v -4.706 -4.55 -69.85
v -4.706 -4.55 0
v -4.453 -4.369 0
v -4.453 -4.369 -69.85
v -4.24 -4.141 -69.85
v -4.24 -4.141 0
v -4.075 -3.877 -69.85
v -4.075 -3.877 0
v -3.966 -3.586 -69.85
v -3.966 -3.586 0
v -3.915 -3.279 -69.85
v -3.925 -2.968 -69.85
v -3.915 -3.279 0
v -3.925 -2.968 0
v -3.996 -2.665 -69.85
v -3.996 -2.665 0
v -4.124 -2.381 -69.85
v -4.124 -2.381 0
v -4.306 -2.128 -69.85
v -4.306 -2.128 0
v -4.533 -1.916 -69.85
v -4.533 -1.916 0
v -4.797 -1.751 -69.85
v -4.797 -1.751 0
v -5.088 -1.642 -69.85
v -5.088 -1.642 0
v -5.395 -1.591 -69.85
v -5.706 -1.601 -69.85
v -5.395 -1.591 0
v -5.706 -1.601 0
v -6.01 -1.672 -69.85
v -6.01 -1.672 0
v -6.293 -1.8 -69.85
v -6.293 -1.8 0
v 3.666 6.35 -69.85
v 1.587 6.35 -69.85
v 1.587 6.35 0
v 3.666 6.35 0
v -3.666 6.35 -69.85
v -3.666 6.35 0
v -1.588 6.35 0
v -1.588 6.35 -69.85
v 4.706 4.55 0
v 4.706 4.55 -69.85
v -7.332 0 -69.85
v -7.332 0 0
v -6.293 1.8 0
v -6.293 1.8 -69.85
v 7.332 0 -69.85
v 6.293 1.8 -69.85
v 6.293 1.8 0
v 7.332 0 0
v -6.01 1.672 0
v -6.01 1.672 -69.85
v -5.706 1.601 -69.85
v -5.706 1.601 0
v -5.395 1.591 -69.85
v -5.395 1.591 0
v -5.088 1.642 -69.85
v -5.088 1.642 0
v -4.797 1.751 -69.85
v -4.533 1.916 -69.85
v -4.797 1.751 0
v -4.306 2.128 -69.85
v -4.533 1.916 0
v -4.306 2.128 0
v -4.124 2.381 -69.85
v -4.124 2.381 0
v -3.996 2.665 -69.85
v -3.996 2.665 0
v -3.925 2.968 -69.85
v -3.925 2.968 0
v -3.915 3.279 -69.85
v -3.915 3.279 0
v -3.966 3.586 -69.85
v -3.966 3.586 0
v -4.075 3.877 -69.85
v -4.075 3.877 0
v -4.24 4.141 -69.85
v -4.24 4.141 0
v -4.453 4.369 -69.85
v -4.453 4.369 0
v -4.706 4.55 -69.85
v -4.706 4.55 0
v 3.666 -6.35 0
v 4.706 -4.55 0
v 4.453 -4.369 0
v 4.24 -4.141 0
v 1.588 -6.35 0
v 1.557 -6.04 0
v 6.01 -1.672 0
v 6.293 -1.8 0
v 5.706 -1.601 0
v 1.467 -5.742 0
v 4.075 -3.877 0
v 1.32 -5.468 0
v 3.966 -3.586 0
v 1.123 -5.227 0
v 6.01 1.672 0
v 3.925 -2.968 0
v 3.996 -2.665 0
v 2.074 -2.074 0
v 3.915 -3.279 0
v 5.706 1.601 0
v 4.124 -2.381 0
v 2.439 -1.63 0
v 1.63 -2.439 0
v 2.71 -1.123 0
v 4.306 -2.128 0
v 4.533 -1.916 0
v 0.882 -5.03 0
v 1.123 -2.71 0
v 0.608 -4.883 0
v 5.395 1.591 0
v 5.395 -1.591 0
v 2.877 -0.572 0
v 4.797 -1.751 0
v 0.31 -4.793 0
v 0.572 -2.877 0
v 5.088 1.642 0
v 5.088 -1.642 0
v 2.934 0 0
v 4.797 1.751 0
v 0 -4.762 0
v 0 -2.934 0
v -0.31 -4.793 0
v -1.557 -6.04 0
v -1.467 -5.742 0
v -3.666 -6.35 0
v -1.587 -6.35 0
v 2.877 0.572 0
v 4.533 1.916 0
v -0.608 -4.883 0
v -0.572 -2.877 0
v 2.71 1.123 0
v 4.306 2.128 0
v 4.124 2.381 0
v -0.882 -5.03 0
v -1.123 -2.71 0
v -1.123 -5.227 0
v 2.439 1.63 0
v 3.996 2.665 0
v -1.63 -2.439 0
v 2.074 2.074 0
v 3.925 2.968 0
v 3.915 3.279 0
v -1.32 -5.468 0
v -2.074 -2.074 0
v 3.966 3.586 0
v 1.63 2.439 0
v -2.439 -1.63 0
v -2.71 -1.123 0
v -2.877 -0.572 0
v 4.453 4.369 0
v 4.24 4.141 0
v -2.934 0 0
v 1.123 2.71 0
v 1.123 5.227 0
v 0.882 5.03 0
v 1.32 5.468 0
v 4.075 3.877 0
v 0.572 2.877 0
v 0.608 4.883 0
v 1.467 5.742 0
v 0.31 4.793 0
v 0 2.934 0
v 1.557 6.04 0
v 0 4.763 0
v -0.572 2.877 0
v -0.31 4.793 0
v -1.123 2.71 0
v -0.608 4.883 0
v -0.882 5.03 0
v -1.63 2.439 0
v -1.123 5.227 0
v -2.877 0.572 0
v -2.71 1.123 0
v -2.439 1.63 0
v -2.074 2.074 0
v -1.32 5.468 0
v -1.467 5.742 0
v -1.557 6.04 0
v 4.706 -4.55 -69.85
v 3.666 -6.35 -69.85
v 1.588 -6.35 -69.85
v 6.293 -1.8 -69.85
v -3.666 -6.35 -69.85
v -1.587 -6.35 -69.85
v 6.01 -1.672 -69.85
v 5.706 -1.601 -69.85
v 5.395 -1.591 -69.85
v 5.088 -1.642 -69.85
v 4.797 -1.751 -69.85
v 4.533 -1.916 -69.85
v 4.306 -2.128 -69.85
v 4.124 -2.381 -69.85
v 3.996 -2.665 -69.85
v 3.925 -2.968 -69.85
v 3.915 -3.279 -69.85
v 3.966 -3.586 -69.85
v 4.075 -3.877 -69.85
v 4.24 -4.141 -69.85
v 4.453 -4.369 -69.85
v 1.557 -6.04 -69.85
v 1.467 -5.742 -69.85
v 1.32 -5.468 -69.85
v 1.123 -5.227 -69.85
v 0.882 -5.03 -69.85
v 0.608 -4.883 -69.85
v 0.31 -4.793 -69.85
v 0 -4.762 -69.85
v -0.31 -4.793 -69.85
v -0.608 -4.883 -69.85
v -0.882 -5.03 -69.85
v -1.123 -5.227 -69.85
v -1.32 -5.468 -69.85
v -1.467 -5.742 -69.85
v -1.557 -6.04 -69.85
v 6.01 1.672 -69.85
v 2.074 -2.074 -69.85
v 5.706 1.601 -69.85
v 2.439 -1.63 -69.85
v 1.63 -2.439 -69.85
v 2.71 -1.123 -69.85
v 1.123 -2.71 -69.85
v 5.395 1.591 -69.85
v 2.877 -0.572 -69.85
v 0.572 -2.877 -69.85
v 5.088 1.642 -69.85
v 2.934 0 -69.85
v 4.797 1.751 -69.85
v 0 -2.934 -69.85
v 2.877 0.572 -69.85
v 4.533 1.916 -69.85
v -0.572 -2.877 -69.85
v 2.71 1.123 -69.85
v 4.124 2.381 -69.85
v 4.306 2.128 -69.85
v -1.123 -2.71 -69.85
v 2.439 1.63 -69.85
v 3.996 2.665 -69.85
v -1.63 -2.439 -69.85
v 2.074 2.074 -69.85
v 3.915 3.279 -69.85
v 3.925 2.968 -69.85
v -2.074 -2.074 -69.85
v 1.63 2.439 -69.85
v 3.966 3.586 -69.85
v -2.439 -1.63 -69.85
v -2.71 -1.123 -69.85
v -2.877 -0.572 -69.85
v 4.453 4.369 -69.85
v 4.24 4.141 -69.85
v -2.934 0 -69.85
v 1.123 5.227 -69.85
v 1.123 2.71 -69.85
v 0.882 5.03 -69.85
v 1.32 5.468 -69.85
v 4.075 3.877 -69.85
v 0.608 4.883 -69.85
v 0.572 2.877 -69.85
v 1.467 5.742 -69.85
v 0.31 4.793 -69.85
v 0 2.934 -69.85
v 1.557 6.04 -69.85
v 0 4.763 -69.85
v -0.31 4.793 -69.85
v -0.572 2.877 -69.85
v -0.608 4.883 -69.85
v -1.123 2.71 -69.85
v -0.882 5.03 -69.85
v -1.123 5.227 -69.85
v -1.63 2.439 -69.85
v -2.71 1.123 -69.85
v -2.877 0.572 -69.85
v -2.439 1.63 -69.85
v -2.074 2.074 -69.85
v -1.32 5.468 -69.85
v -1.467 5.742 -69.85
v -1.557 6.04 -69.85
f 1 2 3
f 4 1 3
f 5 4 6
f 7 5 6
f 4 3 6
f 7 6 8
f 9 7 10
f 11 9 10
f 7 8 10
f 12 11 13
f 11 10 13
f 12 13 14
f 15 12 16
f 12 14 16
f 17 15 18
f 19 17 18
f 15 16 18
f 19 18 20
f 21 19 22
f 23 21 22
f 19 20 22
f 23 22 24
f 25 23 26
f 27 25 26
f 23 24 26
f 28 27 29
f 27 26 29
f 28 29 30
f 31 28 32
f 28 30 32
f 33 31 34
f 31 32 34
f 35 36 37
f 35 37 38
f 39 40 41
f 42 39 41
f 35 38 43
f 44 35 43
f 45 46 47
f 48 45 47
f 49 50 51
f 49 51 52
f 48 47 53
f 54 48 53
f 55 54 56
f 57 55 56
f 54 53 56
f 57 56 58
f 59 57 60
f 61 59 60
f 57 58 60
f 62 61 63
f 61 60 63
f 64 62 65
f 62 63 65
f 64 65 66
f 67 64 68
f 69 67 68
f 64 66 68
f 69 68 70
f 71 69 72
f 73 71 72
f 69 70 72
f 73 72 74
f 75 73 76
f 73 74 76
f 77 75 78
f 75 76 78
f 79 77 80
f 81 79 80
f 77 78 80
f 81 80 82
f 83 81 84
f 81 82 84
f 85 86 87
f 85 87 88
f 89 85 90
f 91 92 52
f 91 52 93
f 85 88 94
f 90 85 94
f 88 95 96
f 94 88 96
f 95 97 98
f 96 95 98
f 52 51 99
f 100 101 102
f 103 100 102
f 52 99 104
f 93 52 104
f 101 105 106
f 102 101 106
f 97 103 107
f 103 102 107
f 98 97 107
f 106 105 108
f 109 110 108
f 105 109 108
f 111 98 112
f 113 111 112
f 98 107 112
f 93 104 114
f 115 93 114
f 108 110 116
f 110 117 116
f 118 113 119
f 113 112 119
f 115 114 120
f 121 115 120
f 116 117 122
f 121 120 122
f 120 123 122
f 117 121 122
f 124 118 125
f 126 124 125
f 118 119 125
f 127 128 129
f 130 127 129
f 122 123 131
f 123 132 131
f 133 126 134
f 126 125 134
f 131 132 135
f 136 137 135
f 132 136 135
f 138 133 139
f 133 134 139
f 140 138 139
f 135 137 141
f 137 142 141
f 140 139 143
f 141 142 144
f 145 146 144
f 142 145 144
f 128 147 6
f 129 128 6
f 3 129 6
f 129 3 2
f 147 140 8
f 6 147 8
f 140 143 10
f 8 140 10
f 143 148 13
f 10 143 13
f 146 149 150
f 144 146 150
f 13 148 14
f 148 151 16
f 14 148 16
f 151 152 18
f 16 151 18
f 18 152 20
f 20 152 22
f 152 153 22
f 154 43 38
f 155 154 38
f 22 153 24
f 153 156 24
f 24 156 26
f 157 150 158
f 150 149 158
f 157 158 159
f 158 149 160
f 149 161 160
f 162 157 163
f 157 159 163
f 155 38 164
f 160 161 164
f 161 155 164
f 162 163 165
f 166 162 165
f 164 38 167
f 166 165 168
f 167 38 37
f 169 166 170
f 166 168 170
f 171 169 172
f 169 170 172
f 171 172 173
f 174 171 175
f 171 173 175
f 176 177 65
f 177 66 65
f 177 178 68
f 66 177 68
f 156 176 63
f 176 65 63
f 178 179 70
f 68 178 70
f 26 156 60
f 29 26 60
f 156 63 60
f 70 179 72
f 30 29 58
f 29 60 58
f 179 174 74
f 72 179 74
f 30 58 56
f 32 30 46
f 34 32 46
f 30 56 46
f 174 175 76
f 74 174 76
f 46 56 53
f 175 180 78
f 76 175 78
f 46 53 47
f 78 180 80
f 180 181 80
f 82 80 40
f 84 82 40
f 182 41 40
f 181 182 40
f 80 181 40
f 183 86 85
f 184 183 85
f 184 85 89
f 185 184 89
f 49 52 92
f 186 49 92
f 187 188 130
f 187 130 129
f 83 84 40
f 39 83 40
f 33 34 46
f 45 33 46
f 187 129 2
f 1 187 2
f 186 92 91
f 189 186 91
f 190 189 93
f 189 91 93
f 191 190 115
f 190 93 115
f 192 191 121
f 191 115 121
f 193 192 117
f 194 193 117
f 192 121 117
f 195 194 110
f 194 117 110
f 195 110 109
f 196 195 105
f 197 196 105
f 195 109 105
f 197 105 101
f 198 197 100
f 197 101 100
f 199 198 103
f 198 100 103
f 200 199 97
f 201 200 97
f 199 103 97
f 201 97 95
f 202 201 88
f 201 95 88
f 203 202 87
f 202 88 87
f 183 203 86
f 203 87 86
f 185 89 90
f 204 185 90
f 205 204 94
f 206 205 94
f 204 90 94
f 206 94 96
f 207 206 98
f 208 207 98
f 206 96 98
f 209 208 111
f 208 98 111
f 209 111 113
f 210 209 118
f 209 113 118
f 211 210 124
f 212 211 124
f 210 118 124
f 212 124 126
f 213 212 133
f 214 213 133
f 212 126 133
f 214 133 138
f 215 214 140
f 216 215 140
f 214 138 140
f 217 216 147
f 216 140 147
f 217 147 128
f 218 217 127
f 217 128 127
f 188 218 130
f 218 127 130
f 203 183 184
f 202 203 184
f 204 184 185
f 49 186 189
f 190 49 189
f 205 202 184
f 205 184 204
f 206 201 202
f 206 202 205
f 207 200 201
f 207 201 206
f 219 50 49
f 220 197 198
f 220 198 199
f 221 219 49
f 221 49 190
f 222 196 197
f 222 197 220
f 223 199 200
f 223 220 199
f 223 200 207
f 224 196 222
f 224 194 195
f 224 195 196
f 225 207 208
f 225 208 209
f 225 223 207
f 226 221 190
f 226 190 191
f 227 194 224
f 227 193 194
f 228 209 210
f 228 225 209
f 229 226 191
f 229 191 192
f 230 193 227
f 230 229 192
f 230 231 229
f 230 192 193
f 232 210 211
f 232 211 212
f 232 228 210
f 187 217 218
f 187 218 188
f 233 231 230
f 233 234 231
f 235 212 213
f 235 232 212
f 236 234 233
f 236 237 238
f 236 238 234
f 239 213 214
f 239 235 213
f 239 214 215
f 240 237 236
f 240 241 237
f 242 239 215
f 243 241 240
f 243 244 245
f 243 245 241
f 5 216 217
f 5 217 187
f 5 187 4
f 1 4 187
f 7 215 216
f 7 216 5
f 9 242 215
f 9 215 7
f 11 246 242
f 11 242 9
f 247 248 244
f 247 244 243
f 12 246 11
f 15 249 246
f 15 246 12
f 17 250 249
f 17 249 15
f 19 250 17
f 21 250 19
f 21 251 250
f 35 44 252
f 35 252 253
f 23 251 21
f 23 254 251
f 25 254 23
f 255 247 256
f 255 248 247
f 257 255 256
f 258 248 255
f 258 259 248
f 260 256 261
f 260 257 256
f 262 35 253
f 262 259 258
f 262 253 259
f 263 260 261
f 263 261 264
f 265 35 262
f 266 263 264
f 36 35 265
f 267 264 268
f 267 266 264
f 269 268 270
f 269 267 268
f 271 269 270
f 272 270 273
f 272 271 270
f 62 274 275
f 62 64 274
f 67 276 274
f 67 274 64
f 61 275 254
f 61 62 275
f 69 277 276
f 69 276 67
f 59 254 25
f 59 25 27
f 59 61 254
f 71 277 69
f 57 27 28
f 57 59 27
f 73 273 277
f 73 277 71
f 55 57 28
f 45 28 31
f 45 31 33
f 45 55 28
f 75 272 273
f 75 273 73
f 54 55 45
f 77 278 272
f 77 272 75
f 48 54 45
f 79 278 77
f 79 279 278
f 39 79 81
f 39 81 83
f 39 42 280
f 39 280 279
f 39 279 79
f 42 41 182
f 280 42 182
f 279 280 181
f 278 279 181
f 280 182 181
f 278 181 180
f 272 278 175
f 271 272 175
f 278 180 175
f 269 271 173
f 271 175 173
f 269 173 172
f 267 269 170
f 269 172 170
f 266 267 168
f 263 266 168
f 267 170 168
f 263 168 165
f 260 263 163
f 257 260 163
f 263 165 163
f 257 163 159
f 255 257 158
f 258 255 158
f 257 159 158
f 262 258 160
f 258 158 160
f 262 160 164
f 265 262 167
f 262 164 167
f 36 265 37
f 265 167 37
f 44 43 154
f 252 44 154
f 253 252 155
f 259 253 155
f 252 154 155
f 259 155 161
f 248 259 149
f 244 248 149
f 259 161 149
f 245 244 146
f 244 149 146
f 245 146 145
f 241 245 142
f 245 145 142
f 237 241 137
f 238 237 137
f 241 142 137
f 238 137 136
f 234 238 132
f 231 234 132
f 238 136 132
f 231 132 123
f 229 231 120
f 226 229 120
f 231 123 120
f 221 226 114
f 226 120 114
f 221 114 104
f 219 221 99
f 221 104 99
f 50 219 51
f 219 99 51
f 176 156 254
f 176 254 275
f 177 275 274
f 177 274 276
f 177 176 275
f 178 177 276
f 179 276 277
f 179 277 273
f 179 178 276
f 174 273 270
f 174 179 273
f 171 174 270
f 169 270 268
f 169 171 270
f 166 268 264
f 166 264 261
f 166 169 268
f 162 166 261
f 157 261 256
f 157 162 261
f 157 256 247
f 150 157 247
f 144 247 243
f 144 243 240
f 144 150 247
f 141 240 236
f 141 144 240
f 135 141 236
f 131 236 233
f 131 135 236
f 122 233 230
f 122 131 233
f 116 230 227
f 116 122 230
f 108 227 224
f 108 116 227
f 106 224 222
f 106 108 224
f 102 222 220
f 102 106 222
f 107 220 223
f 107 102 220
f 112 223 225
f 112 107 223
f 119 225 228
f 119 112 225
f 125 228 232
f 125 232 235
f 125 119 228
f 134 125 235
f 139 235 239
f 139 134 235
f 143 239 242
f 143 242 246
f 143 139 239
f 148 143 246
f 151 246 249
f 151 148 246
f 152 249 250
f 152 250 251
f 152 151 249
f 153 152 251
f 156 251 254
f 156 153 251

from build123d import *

# Parameters (mm, degrees)
SKETCH1_R           = 2.9337
BOSS_EXTRUDE1_DEPTH = 69.85


with BuildPart() as part:
    # Sketch1 → Boss-Extrude1 (new body)
    with BuildSketch(Plane(origin=(0, 0, 0), x_dir=(-1, 0, 0), z_dir=(0, 0, -1))):
        with BuildLine():
            Line((-4.70551159, -4.549815043), (-3.666174521, -6.349999904))
            Line((-3.666174521, -6.349999904), (-1.587500385, -6.349999904))
            ThreePointArc((-1.587500385, -6.349999904), (-3.85e-07, -4.762499904), (1.587499615, -6.349999904))
            Line((1.587499615, -6.349999904), (3.666173825, -6.349999904))
            Line((3.666173825, -6.349999904), (4.705510942, -4.54981524))
            ThreePointArc((4.705510942, -4.54981524), (4.124445629, -2.381249907), (6.293010962, -1.800184594))
            Line((6.293010962, -1.800184594), (7.332348079, 7e-08))
            Line((7.332348079, 7e-08), (6.293011217, 1.800184685))
            ThreePointArc((6.293011217, 1.800184685), (4.124445939, 2.381250203), (4.705511457, 4.549815481))
            Line((4.705511457, 4.549815481), (3.666174521, 6.350000222))
            Line((3.666174521, 6.350000222), (1.587500385, 6.350000222))
            ThreePointArc((1.587500385, 6.350000222), (3.85e-07, 4.762500222), (-1.587499615, 6.350000222))
            Line((-1.587499615, 6.350000222), (-3.666173825, 6.350000222))
            Line((-3.666173825, 6.350000222), (-4.705511038, 4.549815614))
            ThreePointArc((-4.705511038, 4.549815614), (-4.124445841, 2.38125025), (-6.293011205, 1.800185053))
            Line((-6.293011205, 1.800185053), (-7.332348419, 4.44e-07))
            Line((-7.332348419, 4.44e-07), (-6.293011423, -1.80018429))
            ThreePointArc((-6.293011423, -1.80018429), (-4.12444613, -2.38124975), (-4.70551159, -4.549815043))
        make_face()
        Circle(SKETCH1_R, mode=Mode.SUBTRACT)
    extrude(amount=BOSS_EXTRUDE1_DEPTH)


solid = part.part
